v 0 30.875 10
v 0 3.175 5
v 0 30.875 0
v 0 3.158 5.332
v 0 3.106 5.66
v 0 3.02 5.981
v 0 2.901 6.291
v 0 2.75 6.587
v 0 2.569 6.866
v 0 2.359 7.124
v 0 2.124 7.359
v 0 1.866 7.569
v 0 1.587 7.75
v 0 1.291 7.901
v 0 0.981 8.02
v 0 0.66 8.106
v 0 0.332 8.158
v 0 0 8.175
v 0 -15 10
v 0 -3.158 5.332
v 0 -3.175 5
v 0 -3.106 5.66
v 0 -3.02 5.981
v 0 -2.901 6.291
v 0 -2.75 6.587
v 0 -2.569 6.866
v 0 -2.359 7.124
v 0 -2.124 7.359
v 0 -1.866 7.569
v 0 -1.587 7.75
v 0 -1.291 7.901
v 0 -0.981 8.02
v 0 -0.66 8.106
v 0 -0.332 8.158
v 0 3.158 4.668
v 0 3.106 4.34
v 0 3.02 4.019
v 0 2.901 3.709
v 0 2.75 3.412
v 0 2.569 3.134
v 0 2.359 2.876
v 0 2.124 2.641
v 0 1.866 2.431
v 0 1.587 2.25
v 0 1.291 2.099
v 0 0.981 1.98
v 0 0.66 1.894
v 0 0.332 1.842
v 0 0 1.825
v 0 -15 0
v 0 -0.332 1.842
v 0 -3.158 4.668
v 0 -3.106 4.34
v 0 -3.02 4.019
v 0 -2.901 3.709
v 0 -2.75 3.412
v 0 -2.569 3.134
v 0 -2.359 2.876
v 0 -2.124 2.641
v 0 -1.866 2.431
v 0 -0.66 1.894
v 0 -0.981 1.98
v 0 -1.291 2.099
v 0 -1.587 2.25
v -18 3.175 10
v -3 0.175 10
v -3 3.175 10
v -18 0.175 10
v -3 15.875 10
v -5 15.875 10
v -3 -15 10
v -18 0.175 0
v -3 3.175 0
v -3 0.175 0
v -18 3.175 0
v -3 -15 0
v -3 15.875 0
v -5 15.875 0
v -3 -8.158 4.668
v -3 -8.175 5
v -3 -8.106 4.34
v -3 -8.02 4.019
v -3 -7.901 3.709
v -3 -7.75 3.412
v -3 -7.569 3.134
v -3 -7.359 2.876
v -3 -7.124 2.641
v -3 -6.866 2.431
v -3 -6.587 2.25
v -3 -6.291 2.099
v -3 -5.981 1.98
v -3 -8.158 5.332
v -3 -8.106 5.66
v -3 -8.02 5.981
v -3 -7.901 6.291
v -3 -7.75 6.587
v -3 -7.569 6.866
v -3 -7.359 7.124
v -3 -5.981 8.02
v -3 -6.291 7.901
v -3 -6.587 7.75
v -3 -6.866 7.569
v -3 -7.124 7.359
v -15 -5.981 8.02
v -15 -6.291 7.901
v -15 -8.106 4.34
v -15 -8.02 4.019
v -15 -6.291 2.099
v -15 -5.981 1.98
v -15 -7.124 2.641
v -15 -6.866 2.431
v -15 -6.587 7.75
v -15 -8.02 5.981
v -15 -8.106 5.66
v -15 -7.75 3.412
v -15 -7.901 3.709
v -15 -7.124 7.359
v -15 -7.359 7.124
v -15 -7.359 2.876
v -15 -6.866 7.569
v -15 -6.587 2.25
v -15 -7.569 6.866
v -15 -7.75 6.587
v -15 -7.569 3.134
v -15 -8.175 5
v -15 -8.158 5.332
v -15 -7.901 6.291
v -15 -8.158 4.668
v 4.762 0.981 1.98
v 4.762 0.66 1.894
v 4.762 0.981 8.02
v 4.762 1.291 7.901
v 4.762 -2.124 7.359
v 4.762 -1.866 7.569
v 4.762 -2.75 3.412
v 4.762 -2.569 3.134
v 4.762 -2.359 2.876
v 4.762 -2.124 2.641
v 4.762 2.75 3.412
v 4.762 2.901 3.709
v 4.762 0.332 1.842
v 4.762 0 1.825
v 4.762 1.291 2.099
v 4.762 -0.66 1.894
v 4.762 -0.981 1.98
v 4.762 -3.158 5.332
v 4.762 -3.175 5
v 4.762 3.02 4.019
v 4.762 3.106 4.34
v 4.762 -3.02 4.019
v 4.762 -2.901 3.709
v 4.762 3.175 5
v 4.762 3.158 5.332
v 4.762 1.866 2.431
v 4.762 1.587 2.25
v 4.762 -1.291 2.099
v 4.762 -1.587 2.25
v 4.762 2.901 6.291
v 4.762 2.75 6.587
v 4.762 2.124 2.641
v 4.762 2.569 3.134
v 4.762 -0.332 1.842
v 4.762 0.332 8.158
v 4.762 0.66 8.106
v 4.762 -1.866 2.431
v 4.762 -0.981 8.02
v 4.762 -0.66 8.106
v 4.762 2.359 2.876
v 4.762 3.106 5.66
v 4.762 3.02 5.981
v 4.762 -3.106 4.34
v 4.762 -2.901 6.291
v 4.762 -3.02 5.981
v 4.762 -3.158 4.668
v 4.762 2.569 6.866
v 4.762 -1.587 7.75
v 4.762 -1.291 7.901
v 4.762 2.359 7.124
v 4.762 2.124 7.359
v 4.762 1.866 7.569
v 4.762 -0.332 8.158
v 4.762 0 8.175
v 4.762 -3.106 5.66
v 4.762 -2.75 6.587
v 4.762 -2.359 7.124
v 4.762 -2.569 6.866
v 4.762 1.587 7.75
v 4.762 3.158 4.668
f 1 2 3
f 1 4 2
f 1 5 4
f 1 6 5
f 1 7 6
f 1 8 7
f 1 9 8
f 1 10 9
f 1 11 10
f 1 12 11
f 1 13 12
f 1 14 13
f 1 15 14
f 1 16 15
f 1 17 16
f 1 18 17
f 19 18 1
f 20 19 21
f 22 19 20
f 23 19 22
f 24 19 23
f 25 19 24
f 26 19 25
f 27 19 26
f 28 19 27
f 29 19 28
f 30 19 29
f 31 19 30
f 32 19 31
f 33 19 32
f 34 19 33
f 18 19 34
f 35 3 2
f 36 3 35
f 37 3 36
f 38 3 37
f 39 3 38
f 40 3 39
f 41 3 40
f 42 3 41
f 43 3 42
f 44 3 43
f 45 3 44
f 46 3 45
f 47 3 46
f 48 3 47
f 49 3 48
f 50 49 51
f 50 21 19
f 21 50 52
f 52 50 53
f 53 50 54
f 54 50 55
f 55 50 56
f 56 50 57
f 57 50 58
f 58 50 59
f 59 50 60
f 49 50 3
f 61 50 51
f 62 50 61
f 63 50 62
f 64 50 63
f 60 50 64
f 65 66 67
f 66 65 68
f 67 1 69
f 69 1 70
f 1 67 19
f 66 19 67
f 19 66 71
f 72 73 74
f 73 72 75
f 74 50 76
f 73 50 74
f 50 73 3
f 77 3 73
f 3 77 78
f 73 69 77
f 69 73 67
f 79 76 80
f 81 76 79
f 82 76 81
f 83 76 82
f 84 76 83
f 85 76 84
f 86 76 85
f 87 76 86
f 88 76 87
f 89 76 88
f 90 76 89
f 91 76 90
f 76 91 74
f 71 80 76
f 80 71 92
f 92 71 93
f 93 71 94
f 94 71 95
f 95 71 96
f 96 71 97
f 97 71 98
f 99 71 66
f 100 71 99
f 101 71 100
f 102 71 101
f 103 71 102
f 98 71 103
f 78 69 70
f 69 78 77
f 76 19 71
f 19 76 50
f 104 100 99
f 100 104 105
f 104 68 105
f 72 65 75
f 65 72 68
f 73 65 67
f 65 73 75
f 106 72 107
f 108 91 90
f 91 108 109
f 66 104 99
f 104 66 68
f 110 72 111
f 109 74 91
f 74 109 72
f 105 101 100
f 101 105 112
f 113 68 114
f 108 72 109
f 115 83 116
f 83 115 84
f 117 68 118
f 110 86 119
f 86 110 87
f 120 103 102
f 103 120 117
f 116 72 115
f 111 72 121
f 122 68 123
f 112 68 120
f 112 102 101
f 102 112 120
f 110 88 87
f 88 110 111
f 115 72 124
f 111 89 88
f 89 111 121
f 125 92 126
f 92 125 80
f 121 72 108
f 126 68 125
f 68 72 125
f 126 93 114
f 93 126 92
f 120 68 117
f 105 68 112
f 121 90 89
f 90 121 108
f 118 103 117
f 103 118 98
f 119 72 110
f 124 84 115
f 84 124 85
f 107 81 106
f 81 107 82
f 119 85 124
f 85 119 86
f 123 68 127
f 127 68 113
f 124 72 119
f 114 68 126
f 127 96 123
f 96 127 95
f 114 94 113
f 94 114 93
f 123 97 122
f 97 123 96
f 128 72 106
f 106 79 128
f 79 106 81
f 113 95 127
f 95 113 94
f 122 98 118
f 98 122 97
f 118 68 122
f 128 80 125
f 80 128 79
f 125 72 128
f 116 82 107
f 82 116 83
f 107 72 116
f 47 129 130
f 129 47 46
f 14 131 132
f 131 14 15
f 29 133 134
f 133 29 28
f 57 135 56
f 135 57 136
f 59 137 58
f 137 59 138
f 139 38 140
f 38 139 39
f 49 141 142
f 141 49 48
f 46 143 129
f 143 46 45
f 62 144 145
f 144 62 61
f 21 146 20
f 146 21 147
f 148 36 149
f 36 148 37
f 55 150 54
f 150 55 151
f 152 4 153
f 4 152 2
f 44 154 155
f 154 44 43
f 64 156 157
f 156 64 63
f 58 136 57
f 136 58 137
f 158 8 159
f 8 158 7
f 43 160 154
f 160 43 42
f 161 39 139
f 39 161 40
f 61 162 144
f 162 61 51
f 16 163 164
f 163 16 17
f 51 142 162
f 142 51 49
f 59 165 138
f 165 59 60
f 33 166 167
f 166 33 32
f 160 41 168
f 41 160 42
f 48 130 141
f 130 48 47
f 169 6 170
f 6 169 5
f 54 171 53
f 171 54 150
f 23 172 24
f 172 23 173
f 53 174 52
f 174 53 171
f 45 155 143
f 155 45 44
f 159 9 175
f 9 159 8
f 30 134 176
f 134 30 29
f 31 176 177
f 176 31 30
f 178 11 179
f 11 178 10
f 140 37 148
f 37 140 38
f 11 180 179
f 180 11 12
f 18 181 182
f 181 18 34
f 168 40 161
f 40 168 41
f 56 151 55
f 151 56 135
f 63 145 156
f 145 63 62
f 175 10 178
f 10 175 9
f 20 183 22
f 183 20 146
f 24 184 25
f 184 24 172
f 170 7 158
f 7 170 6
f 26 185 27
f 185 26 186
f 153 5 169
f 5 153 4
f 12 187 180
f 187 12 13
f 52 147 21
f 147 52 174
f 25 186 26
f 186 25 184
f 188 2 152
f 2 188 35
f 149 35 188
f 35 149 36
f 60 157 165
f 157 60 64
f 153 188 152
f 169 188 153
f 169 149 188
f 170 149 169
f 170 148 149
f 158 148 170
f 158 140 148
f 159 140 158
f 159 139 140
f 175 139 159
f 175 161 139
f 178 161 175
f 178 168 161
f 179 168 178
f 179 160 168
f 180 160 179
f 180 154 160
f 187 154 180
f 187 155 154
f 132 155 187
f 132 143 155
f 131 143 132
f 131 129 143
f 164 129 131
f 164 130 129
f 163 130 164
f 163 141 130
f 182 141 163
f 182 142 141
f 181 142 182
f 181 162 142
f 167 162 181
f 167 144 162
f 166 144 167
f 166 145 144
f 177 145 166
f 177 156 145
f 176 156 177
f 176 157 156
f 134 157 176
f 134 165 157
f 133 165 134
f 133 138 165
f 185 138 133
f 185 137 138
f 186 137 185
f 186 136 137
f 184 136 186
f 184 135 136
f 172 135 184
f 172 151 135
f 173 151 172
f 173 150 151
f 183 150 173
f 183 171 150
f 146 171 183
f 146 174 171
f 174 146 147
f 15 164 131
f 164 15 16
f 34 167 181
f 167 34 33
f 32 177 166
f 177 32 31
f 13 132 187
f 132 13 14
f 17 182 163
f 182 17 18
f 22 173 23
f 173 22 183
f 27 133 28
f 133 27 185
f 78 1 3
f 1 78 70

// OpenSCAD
// by Hank Cowdog
// 17 Jan 2018
// changes by ALittleSlow
// 18 Dec 2018
// * made pin length parametric
// * fixed parameter ranges to work better with customizer
//
// GNU General Public License, version 2
// http://www.gnu.org/licenses/gpl-2.0.html

// public-facing measurements are in Imperial (e.g. inches)
// Internally, mm are used

//pin thickness, inches
PinDiameterInches		= 0.25;   			//[0.0:0.05:0.75]

//Shelf Thickness,, in 1/16th inch increments
ShelfThicknessFracInches = 8;   //[1:1:16]

//pin length, inches
PinLength = 0.1875;
//
// No editing needed beyond this point
//

// pin is always 5mm
PinLengthMM = PinLength*25.4;

PinDiameterMM = PinDiameterInches*25.4;
PinRadiusMM = PinDiameterMM/2.0;

ShelfThicknessMM  = ShelfThicknessFracInches/16.0*25.4;

VertThicknessMM = 3.0*1;
HorBracketThicknessMM = 3.0*1;
HorBracketLengthMM = 15.0*1.0;
LengthBelowShelfMM = HorBracketLengthMM;

WedgeHeightMM = 15*1;
BarbThicknessMM=2*1;

Fudge =0.0000001*1;  //fudge factor to avoid 3D artifacts at edges when previewing

VertLengthMM = LengthBelowShelfMM + PinRadiusMM + ShelfThicknessMM + Fudge;

// Allow a small edge beyond the pin size, mostly for looks
PinOffsetMM = 1.0*1;

// at least 10mm high on print bed, even if very small pin
BracketHeightMM = max(PinDiameterMM + PinOffsetMM*2.0,10.0);

union() {
    
    //Draw the Vertical Support
    translate([-VertThicknessMM,-LengthBelowShelfMM,0])
    cube([VertThicknessMM,VertLengthMM,BracketHeightMM]);
    
    //Draw the Horizontal Support
    // using hull makes a nice transition from round bottom to flat top
    hull(){
    translate([Fudge-HorBracketLengthMM-VertThicknessMM,PinRadiusMM-HorBracketThicknessMM,0])
        cube([HorBracketLengthMM,HorBracketThicknessMM,BracketHeightMM]);
    
    translate([-HorBracketLengthMM-Fudge, -BracketHeightMM/2.0,BracketHeightMM/2.0])
        rotate([0,90,00]) cylinder(h=HorBracketLengthMM,r=PinRadiusMM,$fn=60);
    }
    
    // Draw the Pin
    translate([0, -Fudge,BracketHeightMM/2.0])
    rotate([0,90,00])cylinder(h=PinLengthMM,r=PinRadiusMM,$fn=60);
    
    
    // Draw the Wedge  - this sits above the shelf to hold it in place
    // using a wedge shape makes it easier to drop the shelf down onto
    // the bracket when installing
    translate([Fudge-VertThicknessMM-BarbThicknessMM,PinRadiusMM+ShelfThicknessMM,0]){
       // cube([WedgeThicknessMM,WedgeHeightMM,BracketHeightMM]);
       linear_extrude(height=BracketHeightMM)
       polygon(points=[
                     [0,0],
                     [BarbThicknessMM+VertThicknessMM,WedgeHeightMM],
                     [BarbThicknessMM+VertThicknessMM,0]
                     ]);        
    }
}
